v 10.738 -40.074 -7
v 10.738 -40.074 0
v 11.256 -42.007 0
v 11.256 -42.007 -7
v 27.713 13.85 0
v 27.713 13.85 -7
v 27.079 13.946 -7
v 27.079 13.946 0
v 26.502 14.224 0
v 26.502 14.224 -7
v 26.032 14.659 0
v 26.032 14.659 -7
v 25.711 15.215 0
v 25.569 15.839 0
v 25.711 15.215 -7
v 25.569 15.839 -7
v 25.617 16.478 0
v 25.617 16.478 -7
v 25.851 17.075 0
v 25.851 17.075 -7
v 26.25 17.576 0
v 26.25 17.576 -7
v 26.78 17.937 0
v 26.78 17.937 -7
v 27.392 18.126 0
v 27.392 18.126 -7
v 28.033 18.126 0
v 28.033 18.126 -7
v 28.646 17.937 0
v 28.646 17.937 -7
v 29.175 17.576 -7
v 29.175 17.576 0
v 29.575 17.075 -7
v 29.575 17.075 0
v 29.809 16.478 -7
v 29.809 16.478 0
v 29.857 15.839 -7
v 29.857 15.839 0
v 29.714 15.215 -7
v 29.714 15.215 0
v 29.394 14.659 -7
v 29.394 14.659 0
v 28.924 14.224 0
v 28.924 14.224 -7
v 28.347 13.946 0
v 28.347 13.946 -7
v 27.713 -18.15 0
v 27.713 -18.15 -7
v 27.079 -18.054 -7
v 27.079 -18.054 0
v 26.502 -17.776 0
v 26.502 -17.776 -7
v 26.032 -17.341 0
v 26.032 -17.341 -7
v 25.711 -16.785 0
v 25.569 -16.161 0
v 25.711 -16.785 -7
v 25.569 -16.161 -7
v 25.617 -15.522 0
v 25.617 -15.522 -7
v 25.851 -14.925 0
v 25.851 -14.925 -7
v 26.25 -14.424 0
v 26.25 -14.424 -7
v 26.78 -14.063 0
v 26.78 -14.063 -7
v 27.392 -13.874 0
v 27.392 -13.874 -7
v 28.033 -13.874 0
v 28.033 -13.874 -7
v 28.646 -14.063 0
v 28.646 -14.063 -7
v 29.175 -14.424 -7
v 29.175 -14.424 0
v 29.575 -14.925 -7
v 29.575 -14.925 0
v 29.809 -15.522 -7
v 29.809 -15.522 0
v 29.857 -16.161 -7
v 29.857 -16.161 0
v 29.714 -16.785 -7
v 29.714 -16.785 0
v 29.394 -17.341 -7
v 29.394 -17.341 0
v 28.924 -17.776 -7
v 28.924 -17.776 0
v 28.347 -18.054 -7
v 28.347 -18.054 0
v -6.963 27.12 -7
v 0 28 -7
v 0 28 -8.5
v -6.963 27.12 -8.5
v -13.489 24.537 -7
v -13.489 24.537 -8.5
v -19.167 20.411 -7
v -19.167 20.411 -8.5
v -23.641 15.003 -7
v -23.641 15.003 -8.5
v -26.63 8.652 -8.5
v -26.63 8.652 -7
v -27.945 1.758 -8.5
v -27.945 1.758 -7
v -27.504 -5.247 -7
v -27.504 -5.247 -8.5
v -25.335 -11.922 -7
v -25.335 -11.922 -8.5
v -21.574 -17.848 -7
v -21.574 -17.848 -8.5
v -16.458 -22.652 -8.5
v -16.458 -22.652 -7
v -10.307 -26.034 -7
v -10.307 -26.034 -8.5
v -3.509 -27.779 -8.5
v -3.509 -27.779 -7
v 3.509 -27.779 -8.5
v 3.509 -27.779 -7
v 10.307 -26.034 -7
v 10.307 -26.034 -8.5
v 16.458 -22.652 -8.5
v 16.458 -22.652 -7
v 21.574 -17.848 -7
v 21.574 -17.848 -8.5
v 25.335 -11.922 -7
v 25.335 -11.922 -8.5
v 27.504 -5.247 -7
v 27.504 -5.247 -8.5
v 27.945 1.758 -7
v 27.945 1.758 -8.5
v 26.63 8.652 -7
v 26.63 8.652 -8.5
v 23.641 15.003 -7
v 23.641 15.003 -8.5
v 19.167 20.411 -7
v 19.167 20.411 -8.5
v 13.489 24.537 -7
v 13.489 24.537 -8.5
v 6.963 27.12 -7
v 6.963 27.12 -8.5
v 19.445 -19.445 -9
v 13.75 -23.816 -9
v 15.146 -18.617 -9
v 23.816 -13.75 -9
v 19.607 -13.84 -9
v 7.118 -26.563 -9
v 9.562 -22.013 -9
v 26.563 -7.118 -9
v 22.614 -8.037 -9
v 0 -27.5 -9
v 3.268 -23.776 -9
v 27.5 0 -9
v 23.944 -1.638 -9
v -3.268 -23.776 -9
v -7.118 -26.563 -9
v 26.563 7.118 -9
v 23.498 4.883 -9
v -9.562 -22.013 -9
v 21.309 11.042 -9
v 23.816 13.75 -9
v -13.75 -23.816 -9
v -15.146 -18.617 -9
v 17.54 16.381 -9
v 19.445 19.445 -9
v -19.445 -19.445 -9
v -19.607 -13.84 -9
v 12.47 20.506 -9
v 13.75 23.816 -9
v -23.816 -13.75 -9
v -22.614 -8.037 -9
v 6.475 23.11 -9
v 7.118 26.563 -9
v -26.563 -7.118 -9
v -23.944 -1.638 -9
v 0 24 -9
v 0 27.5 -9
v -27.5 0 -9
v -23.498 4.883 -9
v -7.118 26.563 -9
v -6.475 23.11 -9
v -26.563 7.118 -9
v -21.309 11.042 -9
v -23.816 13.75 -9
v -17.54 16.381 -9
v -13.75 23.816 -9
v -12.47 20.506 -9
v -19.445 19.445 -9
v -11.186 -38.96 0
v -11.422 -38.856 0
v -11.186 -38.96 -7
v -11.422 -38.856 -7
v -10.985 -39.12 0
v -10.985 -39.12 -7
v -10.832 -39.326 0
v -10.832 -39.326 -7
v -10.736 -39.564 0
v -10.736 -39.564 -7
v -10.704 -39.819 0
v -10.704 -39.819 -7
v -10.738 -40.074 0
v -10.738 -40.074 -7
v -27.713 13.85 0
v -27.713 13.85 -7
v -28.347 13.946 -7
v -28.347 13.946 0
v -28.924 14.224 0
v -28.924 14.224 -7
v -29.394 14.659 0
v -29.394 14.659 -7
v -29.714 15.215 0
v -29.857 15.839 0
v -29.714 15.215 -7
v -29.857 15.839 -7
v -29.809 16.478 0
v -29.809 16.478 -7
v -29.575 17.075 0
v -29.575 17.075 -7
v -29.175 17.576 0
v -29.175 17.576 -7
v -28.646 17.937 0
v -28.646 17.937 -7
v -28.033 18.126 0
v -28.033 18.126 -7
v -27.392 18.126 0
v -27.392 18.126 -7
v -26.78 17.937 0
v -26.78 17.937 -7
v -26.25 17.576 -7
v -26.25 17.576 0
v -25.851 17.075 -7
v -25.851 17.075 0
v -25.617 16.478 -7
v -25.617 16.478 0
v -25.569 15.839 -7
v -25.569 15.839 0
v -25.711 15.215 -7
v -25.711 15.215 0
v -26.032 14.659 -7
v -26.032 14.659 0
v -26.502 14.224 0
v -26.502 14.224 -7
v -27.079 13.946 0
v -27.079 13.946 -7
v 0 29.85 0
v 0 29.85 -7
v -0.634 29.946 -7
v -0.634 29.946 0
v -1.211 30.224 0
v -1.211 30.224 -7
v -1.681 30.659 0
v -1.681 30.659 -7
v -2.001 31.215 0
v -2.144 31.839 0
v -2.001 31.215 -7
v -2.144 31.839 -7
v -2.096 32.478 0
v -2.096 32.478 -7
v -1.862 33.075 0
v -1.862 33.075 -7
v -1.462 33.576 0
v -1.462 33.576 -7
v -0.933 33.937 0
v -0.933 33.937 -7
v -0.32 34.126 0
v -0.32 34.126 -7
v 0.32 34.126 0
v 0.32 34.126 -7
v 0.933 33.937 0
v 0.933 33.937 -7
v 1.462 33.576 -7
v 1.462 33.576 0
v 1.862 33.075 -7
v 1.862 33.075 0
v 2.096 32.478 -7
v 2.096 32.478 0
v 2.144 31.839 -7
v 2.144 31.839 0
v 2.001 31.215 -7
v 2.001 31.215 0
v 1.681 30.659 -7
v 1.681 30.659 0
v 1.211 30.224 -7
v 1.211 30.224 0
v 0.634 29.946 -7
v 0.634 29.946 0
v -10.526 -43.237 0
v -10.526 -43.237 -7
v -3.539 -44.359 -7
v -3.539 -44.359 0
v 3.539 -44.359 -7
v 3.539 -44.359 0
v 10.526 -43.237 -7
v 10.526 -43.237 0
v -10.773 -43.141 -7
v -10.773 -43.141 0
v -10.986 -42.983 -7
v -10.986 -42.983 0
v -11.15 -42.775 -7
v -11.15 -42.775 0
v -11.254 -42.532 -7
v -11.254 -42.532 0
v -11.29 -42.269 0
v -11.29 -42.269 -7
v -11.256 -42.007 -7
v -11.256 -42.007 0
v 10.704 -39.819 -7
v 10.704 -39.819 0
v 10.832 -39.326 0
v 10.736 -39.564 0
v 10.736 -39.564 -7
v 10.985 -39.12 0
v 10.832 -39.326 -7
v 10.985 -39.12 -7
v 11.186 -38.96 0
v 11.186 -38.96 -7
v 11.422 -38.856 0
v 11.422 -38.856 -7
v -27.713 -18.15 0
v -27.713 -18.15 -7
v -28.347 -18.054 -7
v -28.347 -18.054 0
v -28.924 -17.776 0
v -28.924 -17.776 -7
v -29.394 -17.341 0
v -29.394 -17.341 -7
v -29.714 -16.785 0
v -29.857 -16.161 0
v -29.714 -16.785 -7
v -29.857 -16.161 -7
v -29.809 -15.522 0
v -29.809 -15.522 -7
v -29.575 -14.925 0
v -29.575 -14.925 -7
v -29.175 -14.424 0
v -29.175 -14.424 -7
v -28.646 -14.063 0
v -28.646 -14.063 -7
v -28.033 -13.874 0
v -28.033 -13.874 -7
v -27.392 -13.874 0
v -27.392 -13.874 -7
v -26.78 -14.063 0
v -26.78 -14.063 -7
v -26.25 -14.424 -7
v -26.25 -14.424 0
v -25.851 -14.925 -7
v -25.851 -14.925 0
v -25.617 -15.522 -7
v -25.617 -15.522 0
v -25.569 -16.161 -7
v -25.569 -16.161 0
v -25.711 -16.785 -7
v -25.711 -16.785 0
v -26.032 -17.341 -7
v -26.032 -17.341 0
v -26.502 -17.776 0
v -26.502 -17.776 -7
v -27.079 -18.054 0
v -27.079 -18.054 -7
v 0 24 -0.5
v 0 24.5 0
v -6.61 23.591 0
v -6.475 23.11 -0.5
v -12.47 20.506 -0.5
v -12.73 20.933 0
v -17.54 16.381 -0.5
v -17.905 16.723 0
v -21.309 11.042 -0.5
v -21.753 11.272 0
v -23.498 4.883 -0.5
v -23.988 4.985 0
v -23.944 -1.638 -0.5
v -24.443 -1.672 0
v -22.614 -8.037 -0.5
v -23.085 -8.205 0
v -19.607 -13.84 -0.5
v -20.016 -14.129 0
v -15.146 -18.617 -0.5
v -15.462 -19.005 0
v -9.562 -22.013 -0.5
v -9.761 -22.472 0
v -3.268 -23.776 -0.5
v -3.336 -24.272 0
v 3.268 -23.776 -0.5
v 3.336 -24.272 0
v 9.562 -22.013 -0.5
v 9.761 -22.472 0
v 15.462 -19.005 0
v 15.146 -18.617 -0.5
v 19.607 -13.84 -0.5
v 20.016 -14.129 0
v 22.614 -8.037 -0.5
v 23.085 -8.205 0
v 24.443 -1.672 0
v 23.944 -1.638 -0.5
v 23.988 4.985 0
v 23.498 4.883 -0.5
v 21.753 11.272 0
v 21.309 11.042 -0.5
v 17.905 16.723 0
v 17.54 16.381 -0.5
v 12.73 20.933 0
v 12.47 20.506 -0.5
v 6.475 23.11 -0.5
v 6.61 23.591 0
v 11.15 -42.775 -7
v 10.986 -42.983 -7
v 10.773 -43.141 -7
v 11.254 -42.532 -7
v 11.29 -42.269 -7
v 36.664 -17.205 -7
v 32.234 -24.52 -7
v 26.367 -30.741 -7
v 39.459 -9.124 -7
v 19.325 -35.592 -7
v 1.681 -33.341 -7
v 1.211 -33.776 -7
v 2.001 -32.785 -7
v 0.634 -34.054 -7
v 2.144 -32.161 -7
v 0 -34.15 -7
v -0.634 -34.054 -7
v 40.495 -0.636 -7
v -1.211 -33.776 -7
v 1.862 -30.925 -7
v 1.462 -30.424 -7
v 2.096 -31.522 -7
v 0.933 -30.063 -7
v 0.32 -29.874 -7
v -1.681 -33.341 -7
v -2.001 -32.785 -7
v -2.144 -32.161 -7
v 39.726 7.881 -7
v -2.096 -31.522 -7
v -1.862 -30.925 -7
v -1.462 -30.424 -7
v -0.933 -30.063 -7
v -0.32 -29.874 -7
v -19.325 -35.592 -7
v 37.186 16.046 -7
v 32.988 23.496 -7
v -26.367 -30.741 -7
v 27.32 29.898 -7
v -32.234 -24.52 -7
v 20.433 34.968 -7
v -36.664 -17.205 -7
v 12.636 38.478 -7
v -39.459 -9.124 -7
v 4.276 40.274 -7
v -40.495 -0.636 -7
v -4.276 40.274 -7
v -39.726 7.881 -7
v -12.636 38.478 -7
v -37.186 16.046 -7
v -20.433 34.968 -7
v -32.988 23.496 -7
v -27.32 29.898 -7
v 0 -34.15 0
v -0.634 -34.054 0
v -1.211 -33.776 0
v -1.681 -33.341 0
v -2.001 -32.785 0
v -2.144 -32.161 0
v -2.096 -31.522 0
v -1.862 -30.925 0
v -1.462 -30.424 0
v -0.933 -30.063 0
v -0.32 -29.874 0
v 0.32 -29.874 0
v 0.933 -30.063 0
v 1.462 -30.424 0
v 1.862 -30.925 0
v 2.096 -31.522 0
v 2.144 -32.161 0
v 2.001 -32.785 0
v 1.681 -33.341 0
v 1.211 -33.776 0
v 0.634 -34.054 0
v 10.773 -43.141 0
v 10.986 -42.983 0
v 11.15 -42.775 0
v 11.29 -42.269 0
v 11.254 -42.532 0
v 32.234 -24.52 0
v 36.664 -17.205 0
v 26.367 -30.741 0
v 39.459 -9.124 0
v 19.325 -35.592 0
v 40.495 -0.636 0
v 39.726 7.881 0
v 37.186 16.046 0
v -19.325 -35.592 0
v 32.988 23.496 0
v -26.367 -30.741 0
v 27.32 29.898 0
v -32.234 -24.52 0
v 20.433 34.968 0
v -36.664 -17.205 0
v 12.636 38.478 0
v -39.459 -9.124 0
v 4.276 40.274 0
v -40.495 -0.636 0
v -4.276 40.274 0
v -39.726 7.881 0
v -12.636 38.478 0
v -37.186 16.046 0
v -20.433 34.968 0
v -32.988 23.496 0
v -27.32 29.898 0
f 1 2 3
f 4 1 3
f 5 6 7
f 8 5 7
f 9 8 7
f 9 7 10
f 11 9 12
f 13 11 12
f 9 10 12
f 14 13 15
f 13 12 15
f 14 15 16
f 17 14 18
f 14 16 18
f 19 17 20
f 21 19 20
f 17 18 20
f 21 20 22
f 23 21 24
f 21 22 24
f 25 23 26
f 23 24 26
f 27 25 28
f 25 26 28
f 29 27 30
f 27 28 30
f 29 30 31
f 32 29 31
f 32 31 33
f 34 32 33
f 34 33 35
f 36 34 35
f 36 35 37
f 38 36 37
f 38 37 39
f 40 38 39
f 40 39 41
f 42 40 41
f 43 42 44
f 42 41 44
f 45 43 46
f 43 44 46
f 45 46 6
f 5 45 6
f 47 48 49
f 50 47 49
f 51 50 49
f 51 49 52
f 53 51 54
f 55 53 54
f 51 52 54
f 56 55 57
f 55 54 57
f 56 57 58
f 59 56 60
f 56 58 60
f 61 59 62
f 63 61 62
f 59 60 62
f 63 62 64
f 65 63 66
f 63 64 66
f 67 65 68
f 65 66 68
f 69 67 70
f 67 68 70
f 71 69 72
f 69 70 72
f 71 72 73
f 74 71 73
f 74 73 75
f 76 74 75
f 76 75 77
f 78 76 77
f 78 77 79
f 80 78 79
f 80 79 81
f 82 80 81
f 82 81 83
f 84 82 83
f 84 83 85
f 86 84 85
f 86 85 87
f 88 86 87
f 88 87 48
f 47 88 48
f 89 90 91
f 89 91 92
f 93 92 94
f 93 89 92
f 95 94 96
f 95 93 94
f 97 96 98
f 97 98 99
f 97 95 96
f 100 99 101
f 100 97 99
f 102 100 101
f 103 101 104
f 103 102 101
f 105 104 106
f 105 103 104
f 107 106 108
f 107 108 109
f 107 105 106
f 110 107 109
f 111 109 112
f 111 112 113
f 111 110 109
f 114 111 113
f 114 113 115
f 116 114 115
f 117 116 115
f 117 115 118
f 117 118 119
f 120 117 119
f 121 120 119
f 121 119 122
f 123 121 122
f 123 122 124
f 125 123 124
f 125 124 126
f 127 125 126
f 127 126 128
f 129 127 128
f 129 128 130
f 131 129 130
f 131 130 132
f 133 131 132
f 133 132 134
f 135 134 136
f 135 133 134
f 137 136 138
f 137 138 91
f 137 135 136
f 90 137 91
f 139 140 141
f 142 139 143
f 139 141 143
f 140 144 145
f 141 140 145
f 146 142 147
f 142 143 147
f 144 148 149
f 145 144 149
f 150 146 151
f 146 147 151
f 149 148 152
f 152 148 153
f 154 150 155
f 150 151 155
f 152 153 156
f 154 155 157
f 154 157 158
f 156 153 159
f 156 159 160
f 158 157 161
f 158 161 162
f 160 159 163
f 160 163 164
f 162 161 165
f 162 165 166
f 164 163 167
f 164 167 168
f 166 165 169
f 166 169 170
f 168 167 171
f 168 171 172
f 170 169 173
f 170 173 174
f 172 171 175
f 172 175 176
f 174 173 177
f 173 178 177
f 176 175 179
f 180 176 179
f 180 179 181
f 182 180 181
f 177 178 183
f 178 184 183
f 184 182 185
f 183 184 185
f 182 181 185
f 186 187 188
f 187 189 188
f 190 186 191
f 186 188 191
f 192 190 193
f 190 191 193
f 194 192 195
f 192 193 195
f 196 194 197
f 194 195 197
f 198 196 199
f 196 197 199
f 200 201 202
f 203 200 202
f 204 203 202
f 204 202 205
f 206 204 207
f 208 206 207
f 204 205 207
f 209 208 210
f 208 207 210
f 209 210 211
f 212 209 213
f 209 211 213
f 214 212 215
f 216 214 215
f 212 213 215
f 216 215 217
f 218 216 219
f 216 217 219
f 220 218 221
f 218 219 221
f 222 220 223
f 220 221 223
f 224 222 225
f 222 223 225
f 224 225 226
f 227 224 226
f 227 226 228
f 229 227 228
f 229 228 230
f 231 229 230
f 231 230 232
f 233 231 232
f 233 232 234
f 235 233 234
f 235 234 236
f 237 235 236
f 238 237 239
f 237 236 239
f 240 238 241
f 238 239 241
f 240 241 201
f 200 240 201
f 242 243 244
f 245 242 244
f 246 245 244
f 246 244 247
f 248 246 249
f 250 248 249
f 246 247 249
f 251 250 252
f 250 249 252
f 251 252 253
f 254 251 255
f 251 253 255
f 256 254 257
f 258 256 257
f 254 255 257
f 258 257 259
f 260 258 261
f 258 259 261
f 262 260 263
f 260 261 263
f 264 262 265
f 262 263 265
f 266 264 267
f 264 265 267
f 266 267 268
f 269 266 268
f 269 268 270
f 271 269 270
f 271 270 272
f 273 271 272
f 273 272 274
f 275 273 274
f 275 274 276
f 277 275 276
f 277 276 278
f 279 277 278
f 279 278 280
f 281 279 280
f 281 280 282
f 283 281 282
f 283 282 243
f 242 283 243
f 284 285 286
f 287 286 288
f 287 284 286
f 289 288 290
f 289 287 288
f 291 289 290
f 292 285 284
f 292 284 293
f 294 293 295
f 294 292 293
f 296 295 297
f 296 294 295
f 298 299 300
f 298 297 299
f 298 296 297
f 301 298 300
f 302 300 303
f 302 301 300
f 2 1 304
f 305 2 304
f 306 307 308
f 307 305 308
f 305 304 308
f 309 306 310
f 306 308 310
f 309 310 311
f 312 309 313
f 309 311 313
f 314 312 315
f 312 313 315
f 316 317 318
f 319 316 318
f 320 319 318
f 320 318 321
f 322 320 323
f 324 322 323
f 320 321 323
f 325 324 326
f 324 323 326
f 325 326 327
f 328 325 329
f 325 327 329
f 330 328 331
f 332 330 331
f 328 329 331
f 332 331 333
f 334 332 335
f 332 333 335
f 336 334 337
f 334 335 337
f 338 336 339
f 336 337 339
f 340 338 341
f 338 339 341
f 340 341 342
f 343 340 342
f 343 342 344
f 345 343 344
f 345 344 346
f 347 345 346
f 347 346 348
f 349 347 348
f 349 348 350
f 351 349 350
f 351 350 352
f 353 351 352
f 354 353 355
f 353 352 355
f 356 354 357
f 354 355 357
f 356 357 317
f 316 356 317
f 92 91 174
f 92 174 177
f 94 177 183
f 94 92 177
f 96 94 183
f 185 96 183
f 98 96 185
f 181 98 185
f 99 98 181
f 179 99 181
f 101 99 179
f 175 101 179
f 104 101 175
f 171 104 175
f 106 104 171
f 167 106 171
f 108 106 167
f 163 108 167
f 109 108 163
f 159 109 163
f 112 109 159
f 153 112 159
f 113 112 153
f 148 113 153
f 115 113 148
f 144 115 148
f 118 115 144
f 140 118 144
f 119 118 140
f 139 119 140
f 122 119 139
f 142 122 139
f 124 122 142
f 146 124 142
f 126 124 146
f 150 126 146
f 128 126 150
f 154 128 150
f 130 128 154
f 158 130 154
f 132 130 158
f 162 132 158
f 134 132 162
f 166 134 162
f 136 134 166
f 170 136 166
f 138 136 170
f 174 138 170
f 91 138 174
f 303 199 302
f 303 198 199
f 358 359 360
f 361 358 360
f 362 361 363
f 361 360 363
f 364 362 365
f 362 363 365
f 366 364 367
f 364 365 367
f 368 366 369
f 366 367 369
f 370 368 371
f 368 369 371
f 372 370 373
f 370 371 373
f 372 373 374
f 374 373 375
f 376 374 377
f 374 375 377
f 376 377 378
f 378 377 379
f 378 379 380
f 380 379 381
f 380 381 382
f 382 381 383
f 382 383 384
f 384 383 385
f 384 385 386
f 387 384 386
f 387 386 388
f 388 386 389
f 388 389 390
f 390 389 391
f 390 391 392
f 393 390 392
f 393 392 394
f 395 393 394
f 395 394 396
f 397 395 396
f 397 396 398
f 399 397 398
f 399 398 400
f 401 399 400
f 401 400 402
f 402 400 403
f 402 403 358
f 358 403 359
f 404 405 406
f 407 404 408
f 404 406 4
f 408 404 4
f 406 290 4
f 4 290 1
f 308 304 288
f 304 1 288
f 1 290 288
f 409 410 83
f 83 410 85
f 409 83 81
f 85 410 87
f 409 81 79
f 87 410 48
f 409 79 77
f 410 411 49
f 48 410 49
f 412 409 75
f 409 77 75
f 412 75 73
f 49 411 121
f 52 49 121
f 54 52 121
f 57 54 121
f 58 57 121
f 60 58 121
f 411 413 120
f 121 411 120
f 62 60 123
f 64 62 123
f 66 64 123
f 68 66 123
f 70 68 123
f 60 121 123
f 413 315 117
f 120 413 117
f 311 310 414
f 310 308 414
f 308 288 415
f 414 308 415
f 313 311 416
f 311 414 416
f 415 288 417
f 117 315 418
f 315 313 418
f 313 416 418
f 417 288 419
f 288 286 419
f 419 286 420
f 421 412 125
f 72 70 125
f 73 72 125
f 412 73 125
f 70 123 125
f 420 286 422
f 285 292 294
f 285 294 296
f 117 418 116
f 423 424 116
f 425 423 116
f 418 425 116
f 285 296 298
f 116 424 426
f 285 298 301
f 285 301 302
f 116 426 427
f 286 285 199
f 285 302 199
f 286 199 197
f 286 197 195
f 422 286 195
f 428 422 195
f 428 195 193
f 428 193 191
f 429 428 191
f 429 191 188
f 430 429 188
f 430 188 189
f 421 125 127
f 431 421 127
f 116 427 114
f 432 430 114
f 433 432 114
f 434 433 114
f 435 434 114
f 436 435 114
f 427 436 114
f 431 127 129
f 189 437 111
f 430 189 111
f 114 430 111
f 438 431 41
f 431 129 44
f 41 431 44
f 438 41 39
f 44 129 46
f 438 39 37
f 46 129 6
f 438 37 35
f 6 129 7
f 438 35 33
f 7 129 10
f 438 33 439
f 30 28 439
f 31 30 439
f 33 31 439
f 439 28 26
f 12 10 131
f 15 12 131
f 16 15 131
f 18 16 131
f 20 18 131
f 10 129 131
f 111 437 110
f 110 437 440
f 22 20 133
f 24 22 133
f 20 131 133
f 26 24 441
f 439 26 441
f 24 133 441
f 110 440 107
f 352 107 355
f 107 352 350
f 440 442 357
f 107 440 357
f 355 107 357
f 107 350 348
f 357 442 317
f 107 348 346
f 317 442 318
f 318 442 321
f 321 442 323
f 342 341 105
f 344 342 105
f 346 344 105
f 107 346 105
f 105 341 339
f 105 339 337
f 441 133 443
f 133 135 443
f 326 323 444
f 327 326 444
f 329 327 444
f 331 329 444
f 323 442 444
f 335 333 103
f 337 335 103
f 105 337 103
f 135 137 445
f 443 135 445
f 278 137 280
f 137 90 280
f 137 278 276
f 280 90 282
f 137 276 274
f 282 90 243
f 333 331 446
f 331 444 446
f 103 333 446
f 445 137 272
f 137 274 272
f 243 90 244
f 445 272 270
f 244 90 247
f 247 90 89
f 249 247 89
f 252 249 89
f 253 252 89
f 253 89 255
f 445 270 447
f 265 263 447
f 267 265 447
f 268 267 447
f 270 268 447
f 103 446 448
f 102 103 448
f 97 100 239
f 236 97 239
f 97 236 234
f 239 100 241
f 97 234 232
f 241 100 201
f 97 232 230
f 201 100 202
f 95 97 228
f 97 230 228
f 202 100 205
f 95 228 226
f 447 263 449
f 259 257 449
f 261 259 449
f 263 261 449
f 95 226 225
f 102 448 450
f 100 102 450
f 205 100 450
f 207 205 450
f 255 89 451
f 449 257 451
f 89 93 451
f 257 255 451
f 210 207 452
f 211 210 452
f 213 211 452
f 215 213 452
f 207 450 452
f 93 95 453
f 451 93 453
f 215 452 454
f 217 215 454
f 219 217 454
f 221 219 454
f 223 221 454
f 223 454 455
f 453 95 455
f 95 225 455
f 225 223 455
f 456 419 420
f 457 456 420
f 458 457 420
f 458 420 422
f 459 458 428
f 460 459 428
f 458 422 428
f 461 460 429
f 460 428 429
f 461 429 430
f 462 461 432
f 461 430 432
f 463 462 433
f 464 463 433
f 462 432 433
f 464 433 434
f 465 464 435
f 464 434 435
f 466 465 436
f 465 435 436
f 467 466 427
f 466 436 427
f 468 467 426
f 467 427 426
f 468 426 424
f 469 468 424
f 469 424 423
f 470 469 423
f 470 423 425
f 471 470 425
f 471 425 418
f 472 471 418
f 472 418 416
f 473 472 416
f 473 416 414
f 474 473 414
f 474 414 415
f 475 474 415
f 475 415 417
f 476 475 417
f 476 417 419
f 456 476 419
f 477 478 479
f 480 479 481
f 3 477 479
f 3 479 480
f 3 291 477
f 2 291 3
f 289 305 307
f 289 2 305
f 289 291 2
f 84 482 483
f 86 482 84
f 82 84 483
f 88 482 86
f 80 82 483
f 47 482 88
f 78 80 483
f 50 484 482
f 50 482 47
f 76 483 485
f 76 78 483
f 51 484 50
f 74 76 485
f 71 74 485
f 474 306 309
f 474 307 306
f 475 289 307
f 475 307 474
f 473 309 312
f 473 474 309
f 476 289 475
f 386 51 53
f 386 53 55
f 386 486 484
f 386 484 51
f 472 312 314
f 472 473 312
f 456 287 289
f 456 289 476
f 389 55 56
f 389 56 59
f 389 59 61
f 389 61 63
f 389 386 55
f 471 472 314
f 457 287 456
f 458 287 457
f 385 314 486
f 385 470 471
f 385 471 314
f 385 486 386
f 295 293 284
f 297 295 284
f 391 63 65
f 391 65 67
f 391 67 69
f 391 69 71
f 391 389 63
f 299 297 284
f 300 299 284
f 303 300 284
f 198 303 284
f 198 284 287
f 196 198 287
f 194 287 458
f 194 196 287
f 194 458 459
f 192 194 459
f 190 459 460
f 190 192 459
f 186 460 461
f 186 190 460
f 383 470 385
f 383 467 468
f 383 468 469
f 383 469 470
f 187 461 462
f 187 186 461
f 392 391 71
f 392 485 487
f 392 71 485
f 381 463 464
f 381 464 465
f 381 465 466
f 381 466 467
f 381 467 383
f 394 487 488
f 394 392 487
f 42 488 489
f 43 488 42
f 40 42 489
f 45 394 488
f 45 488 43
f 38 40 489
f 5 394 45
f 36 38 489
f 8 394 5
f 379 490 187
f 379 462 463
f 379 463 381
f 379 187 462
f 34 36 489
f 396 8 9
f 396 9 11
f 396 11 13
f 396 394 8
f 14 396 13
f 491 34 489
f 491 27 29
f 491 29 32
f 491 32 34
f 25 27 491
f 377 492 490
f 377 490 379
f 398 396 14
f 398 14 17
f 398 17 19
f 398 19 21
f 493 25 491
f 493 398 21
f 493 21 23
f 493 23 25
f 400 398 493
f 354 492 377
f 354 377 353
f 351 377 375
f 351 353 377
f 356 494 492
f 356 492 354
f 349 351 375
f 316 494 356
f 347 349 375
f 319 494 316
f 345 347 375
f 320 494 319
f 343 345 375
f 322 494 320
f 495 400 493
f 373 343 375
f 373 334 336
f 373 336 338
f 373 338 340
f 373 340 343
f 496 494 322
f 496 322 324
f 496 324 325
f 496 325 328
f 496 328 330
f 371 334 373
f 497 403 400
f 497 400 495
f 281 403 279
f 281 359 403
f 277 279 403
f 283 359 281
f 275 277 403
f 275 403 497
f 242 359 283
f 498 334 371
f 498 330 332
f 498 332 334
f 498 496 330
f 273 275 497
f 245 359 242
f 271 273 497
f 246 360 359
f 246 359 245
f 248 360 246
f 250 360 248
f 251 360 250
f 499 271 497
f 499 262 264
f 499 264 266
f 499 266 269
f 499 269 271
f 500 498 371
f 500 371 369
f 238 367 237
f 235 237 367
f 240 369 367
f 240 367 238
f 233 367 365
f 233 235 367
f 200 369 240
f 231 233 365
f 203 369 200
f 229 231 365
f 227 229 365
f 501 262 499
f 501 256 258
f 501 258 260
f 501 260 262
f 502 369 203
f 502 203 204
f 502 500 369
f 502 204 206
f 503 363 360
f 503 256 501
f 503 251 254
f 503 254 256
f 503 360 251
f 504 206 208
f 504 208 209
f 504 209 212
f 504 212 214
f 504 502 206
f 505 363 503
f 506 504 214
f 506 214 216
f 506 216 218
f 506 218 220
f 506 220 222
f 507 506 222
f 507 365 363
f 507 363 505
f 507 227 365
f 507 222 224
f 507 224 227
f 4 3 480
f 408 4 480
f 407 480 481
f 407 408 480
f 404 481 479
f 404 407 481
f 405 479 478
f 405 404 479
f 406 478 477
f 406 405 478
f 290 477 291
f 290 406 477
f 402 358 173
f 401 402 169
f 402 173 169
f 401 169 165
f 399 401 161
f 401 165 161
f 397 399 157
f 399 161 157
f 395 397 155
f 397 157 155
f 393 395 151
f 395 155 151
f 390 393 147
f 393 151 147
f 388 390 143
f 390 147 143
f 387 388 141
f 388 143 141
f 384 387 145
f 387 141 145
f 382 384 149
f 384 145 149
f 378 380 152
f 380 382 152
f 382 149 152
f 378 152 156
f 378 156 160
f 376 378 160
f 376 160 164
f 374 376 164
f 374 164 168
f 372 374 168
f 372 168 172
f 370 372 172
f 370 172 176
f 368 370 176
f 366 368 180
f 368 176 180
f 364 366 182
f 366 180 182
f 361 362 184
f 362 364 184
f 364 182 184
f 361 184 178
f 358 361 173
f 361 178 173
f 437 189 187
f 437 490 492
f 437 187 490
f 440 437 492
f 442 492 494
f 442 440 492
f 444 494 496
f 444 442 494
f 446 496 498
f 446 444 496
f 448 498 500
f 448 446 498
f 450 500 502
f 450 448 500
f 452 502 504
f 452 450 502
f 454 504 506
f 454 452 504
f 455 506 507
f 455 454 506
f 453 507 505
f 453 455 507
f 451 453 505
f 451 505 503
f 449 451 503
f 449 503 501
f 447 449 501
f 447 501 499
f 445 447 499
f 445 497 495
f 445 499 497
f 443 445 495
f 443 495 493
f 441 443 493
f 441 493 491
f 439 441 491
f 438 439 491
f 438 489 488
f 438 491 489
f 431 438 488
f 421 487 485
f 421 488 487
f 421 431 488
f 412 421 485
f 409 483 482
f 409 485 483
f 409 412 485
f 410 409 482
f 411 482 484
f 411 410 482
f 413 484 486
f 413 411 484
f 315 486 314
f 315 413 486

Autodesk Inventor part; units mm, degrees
ref_plane "YZ Plane" through (0, 0, 0) normal (1, 0, 0) x (0, 1, 0)
ref_plane "XZ Plane" through (0, 0, 0) normal (0, 1, 0) x (-1, 0, 0)
ref_plane "XY Plane" through (0, 0, 0) normal (0, 0, 1) x (1, 0, 0)
sketch "スケッチ2" plane through (0, 0, 0) normal (1, 0, 0) x (0, 1, 0)
  line L0 (24, 0) -> (24, -9)
  line L1 (40.5, 0) -> (40.5, -7)
  line L2 (40.5, 0) -> (24, 0)
  line L3 (24, 0) -> (59, 0)
  line L4 (24, -9) -> (28, -9)
  line L5 (0, -10.8) -> (0, 1.8) projected
  line L6 (28, -9) -> (28, -7)
  line L7 (28, -7) -> (40.5, -7)
  point P0 (0, 0)
  dimension "d40" = 24
  dimension "d41" = 7
  dimension "d42" = 40.5
  dimension "d43" = 28
  dimension "d44" = 2
revolve "回転1" add sketch "スケッチ2" angle 360 about axis through (0, 0, -10) along (0, 0, 1)
sketch "スケッチ4" plane through (0, 0, 0) normal (0, 0, 1) x (1, 0, 0)
  point P0 (0, 0)
  point P1 (0, 32)
  point P2 (-27.7128, 16)
  point P3 (-27.7128, -16)
  point P4 (0, -32)
  point P5 (27.7128, -16)
  point P6 (27.7128, 16)
  dimension "d11" = 32
  dimension "d14" = 360
hole "穴1" at (0, 32, 0) at (-27.7128, 16, 0) at (-27.7128, -16, 0) at (0, -32, 0) at (27.7128, -16, 0) at (27.7128, 16, 0) direction (0, 0, -1) diameter 4.3 end through all clearance for "Socket Head Cap Screw" size "M4" standard "Ansi Metric M Profile"
chamfer "面取り3" distance 0.5 angle 45 1 edges at (0, -28, -9)
chamfer "面取り4" distance 0.5 angle 45 1 edges at (0, -24, 0)
sketch "スケッチ7" plane through (0, 0, 0) normal (0, 0, 1) x (1, 0, 0)
  circle A0 centre (0, 0) radius 40.5 projected
  circle A1 centre (0, 0) radius 44.5
  line L0 (0, 0) -> (11.5174, -42.9837)
  line L1 (0, 0) -> (-11.5174, -42.9837)
  line L2 (0, 62.3) -> (0, -62.3) projected
  point P0 (10.4822, -39.12)
  point P1 (-10.4822, -39.12)
  dimension "d51" = 4
  dimension "d52" = 15
  dimension "d53" = 15
extrude "押し出し3" add sketch "スケッチ7" against normal up to surface (7 mm away) contours L0 A1 L2 A0 | A0 L2 A1 L1 picked at (6.2128, -42.6798) picked at (-1.2928, -43.1102)
fillet "フィレット1" radius 1 4 edges at (10.4822, -39.12, -3.5) (11.5174, -42.9837, -3.5) (-10.4822, -39.12, -3.5) (-11.5174, -42.9837, -3.5)
properties part number "base12" material "ABS プラスチック"
